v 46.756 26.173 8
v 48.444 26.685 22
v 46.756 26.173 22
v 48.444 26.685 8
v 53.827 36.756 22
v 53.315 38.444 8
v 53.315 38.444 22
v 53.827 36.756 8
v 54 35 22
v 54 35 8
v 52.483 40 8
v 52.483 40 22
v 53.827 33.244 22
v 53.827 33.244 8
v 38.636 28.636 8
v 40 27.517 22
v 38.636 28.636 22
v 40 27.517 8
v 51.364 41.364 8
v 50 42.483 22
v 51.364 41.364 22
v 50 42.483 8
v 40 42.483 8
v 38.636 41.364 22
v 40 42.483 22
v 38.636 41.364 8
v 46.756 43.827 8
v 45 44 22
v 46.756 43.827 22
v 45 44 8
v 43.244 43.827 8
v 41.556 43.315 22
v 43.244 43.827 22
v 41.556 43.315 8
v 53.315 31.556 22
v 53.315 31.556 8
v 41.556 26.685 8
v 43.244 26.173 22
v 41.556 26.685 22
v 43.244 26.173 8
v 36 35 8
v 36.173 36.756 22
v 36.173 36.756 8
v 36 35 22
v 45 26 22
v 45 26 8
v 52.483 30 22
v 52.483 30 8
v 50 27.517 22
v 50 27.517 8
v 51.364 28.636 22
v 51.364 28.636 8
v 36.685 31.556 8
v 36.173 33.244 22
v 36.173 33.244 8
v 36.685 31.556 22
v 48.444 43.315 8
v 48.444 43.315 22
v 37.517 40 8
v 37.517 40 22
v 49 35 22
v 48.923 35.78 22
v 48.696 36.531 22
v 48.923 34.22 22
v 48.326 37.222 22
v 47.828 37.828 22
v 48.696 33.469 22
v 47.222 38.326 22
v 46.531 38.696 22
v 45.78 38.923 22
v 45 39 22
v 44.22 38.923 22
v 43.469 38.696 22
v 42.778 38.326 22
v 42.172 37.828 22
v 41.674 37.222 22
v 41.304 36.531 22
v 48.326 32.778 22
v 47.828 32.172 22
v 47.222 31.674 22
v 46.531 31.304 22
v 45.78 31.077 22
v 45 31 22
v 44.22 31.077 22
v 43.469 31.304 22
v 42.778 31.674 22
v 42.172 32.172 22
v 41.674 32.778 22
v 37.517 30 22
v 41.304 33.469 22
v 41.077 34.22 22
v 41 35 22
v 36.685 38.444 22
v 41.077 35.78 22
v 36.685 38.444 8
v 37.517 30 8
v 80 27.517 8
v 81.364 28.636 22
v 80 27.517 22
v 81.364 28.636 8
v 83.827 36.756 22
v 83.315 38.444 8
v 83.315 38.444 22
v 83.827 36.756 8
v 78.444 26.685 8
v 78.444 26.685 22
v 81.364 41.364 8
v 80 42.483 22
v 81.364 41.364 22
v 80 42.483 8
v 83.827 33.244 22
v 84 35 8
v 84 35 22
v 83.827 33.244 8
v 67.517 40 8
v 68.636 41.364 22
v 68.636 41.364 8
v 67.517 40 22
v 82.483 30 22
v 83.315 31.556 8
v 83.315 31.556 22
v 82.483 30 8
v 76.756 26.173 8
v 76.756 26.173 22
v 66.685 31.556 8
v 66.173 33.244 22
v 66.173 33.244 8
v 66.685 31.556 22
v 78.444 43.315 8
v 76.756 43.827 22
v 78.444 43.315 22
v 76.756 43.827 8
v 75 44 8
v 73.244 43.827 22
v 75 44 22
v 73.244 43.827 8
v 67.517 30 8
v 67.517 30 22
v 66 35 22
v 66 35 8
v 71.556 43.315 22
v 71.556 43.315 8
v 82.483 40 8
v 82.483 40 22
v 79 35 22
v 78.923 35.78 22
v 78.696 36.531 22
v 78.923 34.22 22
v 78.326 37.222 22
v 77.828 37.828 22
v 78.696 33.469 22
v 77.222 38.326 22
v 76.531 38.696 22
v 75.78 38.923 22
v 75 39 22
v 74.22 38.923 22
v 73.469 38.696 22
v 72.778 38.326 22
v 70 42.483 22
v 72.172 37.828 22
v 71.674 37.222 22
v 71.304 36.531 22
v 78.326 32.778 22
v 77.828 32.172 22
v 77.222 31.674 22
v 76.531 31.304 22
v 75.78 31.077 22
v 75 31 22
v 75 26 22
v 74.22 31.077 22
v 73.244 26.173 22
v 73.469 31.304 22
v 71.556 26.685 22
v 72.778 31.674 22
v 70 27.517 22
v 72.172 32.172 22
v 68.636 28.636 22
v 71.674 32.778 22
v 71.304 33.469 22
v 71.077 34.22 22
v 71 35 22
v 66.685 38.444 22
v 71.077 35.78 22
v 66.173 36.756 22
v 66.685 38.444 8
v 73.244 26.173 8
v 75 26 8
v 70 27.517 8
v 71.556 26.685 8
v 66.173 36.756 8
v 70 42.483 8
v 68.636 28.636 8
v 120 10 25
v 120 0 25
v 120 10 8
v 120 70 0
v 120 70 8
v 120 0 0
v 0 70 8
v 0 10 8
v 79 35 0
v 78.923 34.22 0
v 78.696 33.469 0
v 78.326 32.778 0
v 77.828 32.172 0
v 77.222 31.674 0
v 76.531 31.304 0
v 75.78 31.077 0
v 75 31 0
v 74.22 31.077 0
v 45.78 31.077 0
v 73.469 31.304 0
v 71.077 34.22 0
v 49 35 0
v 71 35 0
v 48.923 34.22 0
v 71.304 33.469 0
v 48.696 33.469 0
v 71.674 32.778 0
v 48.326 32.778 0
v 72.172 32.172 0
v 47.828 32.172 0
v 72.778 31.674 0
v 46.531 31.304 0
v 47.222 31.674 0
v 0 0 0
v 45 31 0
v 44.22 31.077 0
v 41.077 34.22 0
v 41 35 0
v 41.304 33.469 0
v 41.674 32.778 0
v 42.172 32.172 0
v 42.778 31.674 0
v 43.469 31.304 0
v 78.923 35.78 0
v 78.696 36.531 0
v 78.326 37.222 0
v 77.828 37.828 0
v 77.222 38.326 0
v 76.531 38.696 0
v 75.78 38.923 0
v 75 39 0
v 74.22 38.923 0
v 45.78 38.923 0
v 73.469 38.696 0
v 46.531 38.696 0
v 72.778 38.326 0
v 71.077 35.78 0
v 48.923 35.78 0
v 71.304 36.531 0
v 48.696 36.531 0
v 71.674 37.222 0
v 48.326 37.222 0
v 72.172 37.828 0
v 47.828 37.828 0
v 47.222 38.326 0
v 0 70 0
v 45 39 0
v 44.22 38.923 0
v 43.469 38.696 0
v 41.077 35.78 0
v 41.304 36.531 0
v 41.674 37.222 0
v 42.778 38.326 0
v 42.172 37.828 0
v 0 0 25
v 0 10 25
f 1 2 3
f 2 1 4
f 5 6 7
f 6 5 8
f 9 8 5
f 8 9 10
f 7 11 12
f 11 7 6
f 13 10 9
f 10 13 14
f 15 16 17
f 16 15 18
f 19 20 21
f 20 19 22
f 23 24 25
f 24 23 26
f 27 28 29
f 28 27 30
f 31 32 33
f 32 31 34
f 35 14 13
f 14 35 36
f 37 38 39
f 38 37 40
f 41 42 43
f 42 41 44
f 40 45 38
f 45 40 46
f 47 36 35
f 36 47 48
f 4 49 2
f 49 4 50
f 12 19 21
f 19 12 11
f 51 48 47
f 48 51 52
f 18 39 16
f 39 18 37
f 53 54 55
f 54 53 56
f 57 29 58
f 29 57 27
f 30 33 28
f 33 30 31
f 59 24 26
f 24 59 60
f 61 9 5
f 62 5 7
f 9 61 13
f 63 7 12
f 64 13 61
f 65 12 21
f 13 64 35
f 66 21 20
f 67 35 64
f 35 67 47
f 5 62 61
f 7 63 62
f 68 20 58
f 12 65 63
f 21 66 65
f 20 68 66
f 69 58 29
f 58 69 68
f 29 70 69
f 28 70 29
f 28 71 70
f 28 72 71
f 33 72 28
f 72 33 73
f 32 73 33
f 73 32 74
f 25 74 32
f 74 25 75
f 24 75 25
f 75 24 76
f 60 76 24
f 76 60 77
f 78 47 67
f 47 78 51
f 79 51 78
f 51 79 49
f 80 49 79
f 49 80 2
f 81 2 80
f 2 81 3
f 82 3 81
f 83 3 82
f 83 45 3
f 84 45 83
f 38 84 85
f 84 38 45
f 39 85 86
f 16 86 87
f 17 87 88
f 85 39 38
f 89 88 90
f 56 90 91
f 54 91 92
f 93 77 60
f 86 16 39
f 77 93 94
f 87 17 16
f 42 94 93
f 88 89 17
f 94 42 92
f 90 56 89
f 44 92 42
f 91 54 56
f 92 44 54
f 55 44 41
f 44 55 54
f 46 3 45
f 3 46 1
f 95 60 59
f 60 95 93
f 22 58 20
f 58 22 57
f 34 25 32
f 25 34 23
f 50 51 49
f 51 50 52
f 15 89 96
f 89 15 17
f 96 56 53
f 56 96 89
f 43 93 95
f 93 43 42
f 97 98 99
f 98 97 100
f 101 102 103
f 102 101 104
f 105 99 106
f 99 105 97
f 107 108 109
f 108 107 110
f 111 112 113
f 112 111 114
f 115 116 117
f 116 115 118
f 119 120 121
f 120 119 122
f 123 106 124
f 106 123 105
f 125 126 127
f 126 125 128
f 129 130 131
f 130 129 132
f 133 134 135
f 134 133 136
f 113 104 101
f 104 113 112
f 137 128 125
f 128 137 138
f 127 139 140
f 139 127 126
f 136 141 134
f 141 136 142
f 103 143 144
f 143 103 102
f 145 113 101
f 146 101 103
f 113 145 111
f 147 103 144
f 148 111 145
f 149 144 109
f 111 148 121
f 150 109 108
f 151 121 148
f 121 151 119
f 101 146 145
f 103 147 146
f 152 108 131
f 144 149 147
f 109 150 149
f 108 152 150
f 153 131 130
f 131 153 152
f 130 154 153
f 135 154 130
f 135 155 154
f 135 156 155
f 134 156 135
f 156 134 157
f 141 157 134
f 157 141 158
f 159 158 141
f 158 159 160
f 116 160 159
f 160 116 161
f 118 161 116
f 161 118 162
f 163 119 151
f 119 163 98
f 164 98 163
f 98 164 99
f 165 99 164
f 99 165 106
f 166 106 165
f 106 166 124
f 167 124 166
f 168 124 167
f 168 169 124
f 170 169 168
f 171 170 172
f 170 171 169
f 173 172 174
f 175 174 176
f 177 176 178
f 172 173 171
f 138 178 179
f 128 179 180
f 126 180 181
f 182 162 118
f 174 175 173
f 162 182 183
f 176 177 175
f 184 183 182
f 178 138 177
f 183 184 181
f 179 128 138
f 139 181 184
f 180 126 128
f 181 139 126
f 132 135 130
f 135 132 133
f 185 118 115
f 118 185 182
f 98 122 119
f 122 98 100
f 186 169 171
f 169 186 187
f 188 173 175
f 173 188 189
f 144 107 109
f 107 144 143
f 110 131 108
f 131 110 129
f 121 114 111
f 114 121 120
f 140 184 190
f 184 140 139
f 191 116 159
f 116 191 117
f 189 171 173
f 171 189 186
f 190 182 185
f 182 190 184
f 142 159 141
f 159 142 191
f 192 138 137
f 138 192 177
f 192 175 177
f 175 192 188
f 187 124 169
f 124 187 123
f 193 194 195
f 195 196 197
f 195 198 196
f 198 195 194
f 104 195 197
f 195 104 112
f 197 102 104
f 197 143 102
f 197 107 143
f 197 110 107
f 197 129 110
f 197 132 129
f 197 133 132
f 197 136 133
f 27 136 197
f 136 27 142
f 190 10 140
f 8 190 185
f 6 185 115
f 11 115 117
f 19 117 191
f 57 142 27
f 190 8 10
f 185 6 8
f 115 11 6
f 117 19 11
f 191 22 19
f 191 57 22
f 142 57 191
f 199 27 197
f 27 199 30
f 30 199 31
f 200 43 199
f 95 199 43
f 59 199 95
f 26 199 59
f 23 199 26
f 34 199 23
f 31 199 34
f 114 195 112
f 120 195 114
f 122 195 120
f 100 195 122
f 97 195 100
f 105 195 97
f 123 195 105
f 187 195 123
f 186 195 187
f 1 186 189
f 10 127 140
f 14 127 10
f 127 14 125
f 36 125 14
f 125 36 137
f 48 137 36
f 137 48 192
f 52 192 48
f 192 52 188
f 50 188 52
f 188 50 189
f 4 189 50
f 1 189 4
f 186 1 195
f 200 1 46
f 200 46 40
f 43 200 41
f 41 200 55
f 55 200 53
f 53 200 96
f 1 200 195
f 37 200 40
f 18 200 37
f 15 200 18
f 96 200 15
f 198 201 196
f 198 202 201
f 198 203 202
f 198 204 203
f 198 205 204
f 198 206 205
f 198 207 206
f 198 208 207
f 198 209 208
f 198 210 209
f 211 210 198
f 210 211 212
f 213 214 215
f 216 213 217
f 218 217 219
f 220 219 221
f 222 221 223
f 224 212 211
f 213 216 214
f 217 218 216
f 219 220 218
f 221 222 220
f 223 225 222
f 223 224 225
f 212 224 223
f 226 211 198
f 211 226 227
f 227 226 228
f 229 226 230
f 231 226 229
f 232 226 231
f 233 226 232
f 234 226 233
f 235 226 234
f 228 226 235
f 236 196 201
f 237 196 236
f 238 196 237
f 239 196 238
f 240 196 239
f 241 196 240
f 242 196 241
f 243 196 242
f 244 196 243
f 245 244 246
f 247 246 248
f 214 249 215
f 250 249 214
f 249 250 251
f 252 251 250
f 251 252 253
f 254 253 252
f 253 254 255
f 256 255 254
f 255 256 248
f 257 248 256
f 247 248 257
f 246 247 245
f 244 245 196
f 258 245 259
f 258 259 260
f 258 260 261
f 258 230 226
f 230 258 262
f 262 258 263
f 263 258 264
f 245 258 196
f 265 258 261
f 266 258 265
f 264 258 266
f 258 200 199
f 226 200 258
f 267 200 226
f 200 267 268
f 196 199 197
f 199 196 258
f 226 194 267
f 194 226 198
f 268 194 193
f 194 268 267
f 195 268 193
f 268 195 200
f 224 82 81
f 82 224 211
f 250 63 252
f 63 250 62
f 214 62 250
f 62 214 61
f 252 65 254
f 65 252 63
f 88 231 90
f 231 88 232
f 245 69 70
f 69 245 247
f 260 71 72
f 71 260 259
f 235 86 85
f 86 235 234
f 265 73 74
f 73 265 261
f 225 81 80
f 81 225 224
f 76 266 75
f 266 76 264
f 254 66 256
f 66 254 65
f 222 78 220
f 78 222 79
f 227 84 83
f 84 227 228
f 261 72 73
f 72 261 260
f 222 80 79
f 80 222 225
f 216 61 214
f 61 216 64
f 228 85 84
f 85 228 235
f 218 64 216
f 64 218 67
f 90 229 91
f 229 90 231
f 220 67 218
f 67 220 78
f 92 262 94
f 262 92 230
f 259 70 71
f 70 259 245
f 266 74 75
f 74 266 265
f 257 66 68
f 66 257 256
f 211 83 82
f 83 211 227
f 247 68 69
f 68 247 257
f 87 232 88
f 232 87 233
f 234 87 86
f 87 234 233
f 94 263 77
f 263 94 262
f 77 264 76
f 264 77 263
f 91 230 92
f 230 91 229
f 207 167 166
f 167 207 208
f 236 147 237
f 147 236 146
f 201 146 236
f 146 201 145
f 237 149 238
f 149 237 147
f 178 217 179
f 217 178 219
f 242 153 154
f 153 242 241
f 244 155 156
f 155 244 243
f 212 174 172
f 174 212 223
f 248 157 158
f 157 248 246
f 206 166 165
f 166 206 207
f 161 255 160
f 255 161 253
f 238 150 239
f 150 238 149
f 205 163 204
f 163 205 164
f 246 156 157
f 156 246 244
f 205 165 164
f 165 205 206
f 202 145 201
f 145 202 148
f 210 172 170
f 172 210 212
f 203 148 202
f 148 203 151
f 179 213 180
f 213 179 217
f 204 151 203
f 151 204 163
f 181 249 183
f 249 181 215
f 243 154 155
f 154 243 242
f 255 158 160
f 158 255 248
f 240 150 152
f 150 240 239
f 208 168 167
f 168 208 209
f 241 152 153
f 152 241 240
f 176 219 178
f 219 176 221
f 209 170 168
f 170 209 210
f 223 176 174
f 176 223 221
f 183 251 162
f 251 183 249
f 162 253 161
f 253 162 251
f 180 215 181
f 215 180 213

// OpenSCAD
$fn = 32;

// ----------------------------------------------------------------------
// Drill jig: fence jig
// ----------------------------------------------------------------------

// --- parameters (mm) ---
plate_l = 120;            // plate length, X
plate_w = 70;             // plate width, Y
plate_t = 8;              // plate thickness
boss_d = 18;              // guide boss diameter
boss_h = 15;              // boss height above the plate
guide_d = 8;              // guide hole diameter
boss_pitch = 30;          // boss pitch
fence_h = 18;             // fence height above the plate
fence_t = 10;             // fence thickness

n_boss = 2;  // guide bosses
boss_x0 = (plate_l - (n_boss - 1) * boss_pitch) / 2;  // first boss X
boss_top = plate_t - 1 + boss_h;  // boss crown height
fence_top = plate_t - 1 + fence_h;  // fence crown height
total_h = max([fence_top, boss_top]);  // overall height

difference() {
  union() {
  cube([plate_l, plate_w, plate_t]);
  for (i = [0 : n_boss - 1])
    translate([boss_x0 + i * boss_pitch, plate_w / 2, plate_t - 1])
      cylinder(h = boss_h, d = boss_d);
  translate([0, 0, plate_t - 1]) cube([plate_l, fence_t, fence_h]);
  }
  for (i = [0 : n_boss - 1])
    translate([boss_x0 + i * boss_pitch, plate_w / 2, -1])
      cylinder(h = plate_t + boss_h, d = guide_d);
}
